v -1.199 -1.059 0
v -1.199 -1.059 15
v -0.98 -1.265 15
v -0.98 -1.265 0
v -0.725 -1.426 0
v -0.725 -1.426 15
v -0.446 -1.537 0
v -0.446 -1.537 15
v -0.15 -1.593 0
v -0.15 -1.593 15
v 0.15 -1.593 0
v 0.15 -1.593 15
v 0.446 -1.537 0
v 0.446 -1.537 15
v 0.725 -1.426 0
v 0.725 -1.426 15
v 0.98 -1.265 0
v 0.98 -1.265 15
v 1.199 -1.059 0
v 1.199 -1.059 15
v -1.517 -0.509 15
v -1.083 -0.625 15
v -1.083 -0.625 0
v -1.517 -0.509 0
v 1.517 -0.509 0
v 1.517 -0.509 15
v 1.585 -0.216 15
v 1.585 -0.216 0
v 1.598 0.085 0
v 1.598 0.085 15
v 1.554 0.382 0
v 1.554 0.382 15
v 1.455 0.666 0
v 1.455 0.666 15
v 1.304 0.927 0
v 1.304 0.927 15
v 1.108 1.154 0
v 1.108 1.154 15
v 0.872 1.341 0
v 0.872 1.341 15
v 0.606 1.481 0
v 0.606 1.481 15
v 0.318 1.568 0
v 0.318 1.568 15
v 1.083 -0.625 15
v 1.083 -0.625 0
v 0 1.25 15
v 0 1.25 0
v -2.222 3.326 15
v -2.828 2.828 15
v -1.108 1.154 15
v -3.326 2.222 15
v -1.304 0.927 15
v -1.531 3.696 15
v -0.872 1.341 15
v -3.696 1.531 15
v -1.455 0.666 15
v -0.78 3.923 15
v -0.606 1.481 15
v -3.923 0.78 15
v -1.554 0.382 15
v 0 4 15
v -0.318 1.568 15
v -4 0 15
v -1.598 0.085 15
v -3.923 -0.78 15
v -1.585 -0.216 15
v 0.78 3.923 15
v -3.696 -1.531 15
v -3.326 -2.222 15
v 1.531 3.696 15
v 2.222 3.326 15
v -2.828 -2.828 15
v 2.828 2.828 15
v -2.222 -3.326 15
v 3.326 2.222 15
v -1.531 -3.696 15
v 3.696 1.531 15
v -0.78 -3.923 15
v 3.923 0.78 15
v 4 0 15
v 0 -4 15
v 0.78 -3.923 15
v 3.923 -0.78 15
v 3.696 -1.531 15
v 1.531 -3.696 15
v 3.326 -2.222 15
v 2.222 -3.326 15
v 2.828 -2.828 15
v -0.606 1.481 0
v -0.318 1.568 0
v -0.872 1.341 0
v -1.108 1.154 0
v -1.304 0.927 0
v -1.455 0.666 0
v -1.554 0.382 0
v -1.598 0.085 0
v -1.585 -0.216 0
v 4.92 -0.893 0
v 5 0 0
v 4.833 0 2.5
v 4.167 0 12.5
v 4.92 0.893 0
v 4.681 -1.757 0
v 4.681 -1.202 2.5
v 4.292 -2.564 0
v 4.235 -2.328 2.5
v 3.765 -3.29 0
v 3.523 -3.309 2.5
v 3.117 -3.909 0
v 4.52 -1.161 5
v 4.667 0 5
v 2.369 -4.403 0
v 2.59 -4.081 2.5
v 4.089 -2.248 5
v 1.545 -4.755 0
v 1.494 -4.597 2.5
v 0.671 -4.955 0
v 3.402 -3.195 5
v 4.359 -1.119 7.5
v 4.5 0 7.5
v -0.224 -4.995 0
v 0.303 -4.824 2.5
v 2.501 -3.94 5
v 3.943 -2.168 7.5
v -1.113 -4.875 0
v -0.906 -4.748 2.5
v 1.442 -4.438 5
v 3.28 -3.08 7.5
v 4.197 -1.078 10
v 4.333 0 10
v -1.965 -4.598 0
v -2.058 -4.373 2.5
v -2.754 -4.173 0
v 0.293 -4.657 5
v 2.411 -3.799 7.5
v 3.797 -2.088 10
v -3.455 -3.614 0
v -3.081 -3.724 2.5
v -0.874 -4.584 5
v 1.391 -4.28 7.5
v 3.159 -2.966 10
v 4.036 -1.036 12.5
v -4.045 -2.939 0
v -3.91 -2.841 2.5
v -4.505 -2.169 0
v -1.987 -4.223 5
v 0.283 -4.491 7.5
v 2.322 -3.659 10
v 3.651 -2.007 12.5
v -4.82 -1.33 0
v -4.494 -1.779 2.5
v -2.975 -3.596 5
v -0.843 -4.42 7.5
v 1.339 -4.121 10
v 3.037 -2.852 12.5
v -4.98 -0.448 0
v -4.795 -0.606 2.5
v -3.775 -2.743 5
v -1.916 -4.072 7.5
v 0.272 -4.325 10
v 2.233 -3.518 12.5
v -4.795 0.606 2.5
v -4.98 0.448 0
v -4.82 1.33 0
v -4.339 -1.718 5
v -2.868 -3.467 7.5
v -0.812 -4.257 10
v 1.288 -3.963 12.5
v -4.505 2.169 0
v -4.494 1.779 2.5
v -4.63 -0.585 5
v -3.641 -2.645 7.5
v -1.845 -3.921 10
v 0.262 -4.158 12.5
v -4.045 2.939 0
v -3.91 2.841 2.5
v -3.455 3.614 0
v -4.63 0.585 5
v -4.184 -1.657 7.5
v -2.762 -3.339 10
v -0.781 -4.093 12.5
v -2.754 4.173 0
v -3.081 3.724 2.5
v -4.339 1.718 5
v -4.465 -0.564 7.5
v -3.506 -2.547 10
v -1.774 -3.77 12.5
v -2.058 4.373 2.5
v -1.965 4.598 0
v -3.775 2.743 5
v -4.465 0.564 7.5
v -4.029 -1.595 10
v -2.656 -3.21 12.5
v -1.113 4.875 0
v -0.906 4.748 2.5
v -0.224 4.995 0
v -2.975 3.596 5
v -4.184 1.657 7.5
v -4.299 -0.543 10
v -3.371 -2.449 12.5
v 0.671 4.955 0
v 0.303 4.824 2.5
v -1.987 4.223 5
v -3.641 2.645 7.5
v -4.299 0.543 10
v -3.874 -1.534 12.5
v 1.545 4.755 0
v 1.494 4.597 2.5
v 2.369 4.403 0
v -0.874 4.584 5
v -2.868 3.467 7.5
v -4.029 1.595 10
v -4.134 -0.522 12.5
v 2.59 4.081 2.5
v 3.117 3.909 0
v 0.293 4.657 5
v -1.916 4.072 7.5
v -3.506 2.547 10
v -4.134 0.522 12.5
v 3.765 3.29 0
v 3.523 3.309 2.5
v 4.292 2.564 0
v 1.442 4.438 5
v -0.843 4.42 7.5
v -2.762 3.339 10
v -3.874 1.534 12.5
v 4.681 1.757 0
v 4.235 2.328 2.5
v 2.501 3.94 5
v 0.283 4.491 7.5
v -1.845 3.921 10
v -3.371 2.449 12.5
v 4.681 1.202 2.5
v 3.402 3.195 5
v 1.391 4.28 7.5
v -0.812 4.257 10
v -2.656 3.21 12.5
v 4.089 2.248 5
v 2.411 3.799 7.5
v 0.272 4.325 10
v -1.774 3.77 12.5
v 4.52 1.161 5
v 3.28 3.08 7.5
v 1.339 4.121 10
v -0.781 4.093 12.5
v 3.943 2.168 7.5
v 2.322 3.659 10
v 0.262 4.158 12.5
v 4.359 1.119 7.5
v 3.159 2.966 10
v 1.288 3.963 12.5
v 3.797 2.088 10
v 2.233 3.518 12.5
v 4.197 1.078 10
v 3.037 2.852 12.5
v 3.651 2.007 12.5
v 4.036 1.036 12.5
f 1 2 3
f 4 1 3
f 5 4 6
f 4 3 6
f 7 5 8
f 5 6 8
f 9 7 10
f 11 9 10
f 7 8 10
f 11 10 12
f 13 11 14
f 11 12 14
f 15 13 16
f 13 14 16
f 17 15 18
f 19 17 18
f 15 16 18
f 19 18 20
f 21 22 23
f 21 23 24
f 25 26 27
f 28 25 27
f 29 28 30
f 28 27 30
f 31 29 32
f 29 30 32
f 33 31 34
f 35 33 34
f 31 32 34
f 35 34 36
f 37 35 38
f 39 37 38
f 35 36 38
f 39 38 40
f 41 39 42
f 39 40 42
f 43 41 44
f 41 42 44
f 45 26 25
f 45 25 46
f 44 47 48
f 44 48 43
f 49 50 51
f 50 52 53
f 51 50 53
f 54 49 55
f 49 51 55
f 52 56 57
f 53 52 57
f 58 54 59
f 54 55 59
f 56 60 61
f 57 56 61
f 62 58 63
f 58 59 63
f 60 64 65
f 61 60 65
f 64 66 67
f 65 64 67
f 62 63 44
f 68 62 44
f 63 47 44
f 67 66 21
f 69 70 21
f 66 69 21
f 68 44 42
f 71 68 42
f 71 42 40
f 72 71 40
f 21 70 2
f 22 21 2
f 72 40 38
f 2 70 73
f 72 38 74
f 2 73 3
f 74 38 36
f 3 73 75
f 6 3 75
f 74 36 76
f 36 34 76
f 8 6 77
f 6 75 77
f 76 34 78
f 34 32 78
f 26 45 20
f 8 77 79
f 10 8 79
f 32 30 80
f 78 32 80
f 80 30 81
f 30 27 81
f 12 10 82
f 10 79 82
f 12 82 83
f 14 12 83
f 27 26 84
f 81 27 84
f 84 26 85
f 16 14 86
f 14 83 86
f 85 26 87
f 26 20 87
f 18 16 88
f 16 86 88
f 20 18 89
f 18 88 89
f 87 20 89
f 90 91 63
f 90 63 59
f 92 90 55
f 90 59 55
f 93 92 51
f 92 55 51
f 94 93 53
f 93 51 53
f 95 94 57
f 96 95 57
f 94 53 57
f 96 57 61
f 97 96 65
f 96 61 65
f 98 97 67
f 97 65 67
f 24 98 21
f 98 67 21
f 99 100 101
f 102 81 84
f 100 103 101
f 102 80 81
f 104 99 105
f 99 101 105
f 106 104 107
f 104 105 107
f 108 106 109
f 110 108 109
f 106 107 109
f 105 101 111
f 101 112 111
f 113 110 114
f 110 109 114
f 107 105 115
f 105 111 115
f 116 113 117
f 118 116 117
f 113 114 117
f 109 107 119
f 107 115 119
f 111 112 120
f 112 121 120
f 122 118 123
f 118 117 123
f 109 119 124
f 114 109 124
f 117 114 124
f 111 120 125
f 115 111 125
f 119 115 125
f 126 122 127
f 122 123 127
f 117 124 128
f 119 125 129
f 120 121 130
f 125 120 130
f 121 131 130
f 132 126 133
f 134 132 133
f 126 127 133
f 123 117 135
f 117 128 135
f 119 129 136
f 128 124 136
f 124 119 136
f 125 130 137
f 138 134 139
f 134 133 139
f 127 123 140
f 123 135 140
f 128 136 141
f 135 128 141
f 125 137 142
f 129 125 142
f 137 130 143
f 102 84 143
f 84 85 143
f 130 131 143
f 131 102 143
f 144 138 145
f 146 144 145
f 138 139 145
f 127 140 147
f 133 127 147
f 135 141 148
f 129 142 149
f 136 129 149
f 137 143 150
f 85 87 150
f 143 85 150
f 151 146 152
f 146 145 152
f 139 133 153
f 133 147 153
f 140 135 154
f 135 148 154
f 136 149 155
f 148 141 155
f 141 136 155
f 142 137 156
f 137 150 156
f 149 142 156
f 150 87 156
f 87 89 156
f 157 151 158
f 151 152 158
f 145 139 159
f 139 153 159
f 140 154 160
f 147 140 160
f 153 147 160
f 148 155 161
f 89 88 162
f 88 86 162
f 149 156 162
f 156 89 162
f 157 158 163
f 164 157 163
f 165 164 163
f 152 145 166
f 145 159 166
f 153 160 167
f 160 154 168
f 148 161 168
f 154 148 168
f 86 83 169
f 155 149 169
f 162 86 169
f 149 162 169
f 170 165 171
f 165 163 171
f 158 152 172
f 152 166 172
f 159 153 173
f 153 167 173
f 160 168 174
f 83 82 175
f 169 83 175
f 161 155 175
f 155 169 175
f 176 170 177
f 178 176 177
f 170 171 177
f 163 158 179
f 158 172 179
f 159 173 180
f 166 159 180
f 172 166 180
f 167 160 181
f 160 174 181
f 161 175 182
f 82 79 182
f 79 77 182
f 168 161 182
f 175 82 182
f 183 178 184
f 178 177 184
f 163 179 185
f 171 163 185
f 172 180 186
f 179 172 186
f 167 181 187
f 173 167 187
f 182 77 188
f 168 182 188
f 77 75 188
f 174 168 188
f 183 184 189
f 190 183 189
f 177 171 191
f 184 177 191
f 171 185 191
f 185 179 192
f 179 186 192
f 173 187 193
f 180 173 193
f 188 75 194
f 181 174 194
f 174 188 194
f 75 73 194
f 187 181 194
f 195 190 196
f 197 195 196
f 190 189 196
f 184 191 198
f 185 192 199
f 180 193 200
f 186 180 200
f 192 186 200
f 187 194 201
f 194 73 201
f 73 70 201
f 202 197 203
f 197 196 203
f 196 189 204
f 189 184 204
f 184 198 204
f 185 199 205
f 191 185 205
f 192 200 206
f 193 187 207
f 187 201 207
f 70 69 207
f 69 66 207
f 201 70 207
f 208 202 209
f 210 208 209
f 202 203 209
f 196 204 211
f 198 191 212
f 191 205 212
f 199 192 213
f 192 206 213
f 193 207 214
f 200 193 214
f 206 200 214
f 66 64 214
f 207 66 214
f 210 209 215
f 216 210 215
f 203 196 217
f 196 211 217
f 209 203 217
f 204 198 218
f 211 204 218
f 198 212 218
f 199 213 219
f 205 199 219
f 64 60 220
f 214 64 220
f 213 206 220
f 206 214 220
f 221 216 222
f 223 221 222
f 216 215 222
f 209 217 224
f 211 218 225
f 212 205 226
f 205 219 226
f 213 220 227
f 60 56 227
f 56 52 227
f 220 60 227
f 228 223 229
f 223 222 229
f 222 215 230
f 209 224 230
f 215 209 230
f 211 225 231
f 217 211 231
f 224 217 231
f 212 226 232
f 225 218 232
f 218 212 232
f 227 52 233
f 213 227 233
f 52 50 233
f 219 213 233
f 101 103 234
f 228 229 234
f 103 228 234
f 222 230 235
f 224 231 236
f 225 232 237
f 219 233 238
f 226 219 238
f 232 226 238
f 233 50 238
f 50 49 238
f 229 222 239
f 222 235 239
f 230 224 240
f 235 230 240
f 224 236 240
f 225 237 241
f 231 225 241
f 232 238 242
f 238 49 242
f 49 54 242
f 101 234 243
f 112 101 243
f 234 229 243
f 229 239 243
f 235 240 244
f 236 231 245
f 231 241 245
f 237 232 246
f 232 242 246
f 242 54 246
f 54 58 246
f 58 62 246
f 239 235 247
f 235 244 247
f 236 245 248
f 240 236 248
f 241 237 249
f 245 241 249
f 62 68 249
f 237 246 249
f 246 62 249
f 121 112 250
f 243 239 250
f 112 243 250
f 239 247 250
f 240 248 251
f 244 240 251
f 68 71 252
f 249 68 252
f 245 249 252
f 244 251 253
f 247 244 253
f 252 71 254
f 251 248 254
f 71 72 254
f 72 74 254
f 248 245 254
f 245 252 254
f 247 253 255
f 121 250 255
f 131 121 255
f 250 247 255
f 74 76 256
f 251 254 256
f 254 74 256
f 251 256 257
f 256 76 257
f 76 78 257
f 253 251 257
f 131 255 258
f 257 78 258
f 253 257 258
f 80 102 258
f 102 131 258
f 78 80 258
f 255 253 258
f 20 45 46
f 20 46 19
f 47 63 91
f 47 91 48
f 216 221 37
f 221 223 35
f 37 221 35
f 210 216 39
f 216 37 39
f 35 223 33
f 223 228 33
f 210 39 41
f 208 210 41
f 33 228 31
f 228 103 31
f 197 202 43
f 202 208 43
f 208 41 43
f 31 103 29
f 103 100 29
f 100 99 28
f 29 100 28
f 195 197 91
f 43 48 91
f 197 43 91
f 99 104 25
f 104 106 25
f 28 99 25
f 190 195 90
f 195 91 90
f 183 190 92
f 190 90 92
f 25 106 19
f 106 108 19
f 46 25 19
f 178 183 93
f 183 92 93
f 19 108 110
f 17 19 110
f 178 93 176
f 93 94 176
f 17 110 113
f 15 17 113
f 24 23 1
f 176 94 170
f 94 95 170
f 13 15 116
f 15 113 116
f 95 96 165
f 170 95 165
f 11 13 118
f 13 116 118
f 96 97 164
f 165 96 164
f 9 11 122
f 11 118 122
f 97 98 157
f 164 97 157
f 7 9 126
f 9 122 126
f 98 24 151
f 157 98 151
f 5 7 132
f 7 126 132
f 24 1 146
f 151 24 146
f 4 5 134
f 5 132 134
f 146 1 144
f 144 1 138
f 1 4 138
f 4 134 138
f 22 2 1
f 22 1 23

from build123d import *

# Parameters (mm, degrees)
F2_R     = 1.6
F3_DEPTH = 15
F5_DEPTH = 15


with BuildPart() as f1:
    # F0 (on Front) → F1 (revolve)
    with BuildSketch(Plane.XZ):
        Polygon((0, 15), (0, 0), (5, 0), (4, 15), align=None)
    revolve(axis=Axis((0, 0, 7.5), (0, 0, -1)))

    # F2 (on face) → F3 (cut, through all)
    with BuildSketch(Plane.XY.offset(15)):
        Circle(F2_R)
    extrude(amount=-F3_DEPTH, mode=Mode.SUBTRACT)

    # F4 (on face) → F5 (join, through all)
    with BuildSketch(Plane.XY.offset(15)):
        with BuildLine():
            ThreePointArc((0.3180668057, 1.5680668057), (0, 1.6), (-0.3180668057, 1.5680668057))
            Line((-0.3180668057, 1.5680668057), (0, 1.25))
            Line((0, 1.25), (0.3180668057, 1.5680668057))
        make_face()
        with BuildLine():
            ThreePointArc((1.1989522857, -1.0594873367), (1.3856406461, -0.8), (1.5170190914, -0.508579469))
            Line((1.5170190914, -0.508579469), (1.0825317547, -0.625))
            Line((1.0825317547, -0.625), (1.1989522857, -1.0594873367))
        make_face()
        with BuildLine():
            Line((-1.0825317547, -0.625), (-1.5170190914, -0.508579469))
            ThreePointArc((-1.5170190914, -0.508579469), (-1.3856406461, -0.8), (-1.1989522857, -1.0594873367))
            Line((-1.1989522857, -1.0594873367), (-1.0825317547, -0.625))
        make_face()
    extrude(amount=-F5_DEPTH)


solid = f1.part
